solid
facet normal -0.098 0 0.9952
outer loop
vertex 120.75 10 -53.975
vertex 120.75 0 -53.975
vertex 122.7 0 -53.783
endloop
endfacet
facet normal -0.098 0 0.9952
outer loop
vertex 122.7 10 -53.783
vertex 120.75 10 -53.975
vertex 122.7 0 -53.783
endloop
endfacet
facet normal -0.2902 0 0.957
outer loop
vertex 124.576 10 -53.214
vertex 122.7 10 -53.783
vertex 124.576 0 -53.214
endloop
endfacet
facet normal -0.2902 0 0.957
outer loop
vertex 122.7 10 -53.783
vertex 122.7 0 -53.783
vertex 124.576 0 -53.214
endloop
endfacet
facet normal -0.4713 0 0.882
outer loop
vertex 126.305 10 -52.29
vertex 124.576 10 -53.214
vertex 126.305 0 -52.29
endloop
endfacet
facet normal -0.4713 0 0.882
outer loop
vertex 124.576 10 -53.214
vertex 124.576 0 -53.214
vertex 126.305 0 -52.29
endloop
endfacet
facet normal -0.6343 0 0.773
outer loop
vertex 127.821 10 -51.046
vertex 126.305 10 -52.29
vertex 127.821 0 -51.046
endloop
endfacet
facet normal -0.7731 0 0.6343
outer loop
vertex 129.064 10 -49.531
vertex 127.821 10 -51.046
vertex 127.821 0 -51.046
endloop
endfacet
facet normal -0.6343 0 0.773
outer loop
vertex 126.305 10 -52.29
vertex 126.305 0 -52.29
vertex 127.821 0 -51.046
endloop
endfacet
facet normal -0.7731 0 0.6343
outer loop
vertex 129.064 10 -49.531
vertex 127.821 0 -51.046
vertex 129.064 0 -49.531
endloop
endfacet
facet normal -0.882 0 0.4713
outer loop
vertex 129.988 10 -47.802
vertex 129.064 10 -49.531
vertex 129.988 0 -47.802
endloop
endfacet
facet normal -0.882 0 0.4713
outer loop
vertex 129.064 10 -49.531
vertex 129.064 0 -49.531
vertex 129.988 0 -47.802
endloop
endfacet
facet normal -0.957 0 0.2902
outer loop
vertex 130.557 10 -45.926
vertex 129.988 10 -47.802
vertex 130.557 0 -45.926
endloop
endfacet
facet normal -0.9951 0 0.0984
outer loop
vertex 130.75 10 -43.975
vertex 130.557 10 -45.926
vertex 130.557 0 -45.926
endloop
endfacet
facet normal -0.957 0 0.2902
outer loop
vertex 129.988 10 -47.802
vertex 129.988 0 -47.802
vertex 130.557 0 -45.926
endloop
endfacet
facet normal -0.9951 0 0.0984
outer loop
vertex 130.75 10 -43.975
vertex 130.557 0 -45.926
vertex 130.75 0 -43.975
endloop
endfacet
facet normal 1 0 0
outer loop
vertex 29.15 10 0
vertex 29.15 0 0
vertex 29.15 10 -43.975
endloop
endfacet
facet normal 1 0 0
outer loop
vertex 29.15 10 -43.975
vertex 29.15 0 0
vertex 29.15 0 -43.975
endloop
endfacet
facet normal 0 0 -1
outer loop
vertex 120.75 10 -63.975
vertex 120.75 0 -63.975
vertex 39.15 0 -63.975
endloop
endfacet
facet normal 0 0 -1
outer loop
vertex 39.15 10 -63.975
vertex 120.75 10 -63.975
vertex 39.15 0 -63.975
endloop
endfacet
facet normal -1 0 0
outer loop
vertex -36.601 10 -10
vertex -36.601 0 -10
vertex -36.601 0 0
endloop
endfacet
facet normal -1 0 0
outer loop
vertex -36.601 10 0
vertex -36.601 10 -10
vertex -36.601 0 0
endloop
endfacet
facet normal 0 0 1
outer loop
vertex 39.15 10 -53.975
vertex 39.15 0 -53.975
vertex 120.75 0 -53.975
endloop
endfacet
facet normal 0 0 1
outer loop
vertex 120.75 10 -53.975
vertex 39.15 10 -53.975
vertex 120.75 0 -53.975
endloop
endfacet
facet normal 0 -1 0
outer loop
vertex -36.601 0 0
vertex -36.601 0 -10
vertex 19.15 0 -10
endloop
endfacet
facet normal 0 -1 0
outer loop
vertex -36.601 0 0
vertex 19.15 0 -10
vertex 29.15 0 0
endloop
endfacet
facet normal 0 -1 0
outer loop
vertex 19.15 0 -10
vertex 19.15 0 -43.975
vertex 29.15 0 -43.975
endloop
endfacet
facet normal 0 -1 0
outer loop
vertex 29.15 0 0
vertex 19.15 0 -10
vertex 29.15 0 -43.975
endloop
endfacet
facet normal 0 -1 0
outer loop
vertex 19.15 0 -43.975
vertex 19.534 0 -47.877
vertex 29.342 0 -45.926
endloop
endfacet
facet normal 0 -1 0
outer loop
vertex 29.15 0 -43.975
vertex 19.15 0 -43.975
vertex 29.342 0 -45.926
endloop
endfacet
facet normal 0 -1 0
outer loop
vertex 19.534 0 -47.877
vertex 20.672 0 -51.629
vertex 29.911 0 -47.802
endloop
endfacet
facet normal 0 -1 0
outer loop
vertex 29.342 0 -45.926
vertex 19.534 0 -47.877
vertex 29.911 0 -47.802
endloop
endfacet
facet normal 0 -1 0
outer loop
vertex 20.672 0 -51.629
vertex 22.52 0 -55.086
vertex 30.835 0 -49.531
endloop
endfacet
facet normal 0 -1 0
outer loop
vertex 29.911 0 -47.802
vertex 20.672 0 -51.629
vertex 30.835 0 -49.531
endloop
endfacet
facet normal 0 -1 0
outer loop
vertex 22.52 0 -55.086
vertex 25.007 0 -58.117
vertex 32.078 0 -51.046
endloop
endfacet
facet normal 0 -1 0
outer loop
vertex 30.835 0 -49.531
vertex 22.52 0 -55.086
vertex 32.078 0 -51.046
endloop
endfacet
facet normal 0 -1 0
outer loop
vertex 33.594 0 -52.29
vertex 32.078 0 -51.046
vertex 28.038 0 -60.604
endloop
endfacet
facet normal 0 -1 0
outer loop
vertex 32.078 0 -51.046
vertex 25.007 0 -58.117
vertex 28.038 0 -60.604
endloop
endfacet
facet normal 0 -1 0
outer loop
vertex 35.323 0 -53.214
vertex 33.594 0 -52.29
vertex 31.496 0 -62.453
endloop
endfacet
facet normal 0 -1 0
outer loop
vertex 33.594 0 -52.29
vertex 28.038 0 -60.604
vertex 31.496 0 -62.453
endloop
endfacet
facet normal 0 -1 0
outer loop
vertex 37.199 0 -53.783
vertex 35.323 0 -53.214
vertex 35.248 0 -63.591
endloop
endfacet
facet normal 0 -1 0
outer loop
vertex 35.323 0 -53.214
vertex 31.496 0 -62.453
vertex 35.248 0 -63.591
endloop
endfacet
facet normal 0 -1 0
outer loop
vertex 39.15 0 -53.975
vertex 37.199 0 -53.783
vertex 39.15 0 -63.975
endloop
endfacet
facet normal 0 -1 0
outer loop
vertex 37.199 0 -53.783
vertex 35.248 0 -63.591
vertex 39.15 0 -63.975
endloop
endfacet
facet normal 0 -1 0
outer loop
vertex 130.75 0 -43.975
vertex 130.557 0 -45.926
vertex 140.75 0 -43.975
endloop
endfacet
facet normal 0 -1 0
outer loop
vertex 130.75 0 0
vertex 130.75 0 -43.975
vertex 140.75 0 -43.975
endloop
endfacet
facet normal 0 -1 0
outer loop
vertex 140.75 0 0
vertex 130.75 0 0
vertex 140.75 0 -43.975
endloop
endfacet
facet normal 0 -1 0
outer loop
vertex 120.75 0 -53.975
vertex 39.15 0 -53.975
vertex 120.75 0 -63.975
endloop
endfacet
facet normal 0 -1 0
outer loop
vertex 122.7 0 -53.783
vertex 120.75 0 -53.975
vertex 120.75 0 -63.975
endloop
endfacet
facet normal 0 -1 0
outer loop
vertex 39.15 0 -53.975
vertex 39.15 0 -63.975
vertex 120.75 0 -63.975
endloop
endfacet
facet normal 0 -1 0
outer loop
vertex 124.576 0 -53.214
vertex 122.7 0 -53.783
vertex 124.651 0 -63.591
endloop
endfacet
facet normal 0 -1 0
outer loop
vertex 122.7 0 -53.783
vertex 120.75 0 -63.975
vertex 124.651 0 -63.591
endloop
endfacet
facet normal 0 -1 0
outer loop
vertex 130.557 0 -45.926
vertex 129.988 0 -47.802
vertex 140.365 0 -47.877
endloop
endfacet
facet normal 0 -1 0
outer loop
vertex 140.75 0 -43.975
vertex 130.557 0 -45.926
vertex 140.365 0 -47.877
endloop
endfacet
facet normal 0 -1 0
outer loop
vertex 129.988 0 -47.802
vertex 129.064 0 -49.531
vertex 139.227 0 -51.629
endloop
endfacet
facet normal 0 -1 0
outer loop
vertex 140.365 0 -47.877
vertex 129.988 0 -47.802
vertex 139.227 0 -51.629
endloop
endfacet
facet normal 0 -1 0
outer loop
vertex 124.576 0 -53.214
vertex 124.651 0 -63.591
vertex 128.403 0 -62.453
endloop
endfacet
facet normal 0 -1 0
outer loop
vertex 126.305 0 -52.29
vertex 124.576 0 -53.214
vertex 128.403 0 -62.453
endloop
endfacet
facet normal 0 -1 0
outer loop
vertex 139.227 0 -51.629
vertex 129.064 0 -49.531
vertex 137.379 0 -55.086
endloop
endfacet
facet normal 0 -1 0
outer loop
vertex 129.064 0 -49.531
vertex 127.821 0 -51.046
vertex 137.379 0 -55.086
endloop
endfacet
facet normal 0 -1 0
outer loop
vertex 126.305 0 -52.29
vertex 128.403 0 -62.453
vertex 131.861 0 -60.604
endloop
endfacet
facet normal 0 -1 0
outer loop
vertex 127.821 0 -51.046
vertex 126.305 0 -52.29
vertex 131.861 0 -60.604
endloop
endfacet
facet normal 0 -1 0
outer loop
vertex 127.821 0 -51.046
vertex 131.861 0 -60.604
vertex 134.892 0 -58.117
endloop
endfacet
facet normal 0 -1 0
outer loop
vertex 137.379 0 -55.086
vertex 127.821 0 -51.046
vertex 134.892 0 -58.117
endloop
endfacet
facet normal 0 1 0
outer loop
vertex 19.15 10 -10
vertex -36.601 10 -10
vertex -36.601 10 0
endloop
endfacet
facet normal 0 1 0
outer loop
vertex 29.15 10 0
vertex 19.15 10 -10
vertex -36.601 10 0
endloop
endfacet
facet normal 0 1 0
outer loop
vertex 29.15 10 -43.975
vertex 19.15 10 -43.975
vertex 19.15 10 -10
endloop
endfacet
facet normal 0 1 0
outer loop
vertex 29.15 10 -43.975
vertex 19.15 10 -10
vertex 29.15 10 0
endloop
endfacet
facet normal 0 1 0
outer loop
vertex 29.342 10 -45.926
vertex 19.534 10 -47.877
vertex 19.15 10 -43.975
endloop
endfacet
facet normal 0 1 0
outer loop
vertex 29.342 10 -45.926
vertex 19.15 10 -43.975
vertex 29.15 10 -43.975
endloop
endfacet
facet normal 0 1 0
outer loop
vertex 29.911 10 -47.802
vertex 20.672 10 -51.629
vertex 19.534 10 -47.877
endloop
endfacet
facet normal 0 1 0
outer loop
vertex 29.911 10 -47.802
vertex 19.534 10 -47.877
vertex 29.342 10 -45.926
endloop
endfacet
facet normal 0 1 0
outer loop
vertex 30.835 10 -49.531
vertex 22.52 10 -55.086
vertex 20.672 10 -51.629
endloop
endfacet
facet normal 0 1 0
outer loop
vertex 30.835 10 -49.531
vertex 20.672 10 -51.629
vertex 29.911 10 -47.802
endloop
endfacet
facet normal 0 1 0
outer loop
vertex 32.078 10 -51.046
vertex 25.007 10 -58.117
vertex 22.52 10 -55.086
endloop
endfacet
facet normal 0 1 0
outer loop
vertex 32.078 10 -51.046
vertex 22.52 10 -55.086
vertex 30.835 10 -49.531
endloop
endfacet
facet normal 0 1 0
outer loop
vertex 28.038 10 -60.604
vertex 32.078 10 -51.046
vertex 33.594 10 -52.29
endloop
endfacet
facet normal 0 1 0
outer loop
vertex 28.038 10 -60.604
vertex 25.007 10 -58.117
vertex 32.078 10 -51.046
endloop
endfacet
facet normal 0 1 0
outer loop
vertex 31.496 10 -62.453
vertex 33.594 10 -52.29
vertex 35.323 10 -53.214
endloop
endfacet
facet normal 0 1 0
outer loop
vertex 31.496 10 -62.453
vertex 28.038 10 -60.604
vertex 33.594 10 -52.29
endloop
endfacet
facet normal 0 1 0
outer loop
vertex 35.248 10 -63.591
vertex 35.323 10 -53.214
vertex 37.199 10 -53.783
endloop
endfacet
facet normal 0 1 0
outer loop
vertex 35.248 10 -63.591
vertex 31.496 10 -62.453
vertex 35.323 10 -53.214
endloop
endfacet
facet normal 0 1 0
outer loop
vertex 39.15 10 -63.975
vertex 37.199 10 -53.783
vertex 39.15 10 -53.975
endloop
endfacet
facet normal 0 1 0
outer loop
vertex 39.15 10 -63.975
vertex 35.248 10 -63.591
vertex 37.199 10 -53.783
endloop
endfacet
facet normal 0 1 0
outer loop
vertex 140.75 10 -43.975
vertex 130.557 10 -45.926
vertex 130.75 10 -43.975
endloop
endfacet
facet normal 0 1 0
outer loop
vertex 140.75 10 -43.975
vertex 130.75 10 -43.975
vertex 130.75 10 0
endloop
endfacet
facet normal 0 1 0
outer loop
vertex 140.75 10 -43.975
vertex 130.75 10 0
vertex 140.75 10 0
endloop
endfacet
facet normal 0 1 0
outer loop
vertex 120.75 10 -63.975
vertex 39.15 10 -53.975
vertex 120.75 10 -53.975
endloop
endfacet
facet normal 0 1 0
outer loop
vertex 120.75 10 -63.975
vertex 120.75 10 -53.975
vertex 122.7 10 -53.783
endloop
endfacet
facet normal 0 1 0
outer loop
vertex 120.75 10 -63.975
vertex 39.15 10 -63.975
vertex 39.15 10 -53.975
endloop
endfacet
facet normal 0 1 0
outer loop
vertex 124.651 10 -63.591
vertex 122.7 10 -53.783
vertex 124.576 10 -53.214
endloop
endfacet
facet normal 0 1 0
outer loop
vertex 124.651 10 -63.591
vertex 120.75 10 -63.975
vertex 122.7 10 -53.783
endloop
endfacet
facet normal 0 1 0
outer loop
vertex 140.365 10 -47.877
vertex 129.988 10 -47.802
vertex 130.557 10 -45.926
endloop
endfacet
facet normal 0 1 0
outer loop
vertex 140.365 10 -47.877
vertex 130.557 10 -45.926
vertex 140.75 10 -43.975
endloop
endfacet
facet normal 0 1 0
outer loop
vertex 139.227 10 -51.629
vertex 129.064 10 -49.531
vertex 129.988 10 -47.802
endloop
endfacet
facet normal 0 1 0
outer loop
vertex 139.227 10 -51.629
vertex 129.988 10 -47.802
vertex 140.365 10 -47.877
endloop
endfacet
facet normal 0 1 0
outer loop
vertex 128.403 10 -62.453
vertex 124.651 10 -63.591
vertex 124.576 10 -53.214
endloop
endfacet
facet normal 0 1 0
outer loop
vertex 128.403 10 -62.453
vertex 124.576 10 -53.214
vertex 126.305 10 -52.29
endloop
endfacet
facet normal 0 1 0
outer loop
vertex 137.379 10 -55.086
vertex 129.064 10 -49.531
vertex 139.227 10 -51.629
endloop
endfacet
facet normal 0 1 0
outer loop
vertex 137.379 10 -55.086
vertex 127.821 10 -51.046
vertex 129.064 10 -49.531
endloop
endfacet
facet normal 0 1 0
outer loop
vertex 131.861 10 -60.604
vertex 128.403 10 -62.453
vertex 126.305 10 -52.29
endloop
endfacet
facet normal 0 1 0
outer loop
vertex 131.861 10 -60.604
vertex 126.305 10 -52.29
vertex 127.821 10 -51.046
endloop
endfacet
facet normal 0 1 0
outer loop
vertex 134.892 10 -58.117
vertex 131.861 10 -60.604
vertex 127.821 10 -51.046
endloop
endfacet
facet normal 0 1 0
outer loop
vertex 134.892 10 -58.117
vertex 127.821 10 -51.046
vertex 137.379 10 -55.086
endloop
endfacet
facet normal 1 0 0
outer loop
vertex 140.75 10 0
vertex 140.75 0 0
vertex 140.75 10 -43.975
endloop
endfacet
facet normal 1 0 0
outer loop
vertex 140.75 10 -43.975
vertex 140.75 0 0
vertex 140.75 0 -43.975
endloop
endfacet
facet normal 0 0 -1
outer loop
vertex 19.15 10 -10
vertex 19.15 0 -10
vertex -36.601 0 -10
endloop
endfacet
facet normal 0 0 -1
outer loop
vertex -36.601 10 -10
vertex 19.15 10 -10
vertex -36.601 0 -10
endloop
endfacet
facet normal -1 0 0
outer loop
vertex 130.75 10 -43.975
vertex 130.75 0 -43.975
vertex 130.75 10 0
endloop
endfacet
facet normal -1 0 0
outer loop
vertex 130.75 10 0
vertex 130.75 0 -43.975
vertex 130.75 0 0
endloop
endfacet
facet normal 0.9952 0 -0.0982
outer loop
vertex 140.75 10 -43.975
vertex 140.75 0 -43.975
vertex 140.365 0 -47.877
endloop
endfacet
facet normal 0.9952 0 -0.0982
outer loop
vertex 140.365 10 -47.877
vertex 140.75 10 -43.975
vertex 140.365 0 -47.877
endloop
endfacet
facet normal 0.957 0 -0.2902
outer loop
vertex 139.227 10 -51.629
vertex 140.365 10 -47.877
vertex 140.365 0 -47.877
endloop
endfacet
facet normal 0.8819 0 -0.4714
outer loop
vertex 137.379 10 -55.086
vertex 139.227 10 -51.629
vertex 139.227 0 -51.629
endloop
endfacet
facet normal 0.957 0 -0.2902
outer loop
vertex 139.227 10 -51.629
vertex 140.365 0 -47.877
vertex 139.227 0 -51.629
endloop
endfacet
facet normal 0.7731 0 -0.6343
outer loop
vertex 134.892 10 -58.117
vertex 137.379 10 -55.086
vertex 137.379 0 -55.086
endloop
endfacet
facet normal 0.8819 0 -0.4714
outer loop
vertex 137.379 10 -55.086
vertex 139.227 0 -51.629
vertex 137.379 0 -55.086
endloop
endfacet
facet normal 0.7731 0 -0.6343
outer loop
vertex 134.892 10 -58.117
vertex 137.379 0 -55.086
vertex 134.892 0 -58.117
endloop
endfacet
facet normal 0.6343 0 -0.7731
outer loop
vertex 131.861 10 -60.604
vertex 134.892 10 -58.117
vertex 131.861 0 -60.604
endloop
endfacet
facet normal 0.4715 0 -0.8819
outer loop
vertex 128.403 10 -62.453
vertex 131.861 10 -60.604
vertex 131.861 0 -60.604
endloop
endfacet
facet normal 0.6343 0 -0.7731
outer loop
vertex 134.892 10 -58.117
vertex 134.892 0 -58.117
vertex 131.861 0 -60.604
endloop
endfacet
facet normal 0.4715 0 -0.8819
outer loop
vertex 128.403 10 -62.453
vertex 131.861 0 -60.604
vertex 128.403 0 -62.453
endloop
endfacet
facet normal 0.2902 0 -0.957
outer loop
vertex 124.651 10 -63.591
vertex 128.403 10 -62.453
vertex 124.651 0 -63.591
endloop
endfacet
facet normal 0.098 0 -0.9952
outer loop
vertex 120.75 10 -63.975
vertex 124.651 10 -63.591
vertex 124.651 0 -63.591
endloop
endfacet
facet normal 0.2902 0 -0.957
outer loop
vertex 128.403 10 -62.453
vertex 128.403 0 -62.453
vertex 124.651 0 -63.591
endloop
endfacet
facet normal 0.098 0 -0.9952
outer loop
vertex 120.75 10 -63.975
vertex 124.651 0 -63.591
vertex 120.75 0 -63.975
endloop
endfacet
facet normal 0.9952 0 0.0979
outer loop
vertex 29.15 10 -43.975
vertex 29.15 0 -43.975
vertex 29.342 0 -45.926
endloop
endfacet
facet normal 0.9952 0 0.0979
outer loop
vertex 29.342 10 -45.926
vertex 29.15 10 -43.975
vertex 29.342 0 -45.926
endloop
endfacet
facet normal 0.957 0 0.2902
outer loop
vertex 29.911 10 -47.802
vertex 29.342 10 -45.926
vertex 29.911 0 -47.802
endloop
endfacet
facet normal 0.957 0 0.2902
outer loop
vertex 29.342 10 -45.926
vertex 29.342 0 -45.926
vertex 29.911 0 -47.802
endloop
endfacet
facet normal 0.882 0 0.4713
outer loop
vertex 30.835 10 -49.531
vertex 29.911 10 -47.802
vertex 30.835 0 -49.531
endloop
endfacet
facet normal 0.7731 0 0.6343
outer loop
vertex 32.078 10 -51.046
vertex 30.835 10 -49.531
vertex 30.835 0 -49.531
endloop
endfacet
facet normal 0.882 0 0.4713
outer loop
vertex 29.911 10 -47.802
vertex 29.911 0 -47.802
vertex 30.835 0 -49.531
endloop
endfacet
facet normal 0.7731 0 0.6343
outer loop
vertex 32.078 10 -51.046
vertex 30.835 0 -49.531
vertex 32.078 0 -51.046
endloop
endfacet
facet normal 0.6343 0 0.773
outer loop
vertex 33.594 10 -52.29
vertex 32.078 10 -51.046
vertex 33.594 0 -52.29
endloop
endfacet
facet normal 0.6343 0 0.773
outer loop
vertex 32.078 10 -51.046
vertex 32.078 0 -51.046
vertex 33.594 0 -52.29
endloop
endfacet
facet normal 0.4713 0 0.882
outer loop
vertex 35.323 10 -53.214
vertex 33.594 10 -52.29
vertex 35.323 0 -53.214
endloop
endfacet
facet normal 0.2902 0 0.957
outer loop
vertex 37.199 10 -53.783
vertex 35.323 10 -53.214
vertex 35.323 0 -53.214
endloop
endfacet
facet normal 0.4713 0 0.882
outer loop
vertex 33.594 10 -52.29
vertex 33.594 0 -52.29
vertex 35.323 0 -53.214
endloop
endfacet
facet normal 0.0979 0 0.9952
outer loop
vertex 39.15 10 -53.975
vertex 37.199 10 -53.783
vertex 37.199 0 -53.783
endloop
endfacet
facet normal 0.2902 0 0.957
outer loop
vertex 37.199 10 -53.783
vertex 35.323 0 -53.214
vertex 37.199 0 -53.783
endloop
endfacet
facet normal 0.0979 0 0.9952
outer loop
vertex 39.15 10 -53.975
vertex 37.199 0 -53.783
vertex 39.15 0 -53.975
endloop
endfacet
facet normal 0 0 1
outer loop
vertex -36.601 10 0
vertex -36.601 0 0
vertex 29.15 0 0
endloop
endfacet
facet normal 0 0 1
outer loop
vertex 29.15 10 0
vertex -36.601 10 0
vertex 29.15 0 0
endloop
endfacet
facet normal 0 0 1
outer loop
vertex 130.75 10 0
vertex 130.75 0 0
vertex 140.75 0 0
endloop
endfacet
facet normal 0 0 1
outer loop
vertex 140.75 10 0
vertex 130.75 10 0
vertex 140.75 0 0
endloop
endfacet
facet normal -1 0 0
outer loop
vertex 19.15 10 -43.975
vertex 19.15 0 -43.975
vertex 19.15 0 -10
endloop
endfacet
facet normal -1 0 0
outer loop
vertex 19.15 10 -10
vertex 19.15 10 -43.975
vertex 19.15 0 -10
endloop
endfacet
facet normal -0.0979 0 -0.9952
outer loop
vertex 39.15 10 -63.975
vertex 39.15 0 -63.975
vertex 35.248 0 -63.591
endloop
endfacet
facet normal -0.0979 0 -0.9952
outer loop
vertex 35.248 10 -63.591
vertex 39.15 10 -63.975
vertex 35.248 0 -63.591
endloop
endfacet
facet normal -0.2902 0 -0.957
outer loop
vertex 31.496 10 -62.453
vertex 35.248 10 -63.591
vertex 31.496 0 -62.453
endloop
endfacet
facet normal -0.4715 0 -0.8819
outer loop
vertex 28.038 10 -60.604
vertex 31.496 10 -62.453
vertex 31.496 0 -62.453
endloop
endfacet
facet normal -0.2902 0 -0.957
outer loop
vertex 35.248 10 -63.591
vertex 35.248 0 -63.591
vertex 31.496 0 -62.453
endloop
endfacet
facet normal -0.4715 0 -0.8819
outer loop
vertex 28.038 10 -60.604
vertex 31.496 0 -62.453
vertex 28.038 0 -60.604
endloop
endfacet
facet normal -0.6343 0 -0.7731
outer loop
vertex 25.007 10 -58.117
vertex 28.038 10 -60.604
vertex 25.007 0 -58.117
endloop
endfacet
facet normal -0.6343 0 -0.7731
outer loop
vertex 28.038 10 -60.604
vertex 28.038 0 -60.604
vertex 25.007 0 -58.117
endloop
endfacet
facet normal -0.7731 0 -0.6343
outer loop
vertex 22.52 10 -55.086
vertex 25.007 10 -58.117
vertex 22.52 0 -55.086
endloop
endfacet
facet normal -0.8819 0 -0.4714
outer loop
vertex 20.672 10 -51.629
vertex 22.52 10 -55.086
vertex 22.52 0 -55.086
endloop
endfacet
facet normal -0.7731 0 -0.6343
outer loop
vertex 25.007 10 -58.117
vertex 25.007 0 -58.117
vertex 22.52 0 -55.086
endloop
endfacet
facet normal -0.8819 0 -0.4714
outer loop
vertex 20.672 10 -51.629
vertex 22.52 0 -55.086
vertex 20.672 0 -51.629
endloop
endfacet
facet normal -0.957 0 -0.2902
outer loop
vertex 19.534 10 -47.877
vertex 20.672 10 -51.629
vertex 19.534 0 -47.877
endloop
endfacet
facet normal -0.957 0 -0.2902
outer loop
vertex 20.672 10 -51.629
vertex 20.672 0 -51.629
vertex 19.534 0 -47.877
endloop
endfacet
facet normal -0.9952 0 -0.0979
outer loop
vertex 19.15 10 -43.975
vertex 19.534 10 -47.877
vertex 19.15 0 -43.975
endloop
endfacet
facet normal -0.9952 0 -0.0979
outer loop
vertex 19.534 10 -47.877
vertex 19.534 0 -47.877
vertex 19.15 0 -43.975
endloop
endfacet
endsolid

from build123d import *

# Parameters (mm, degrees)
BOSS_EXTRUDE1_DEPTH = 10


with BuildPart() as part:
    # Sketch1 → Boss-Extrude1 (new body)
    with BuildSketch(Plane(origin=(0, 0, 0), x_dir=(1, 0, 0), z_dir=(0, 1, 0))):
        with BuildLine():
            Line((0, 0), (29.149551568, 0))
            Line((29.149551568, 0), (29.149551568, 43.975))
            ThreePointArc((29.149551568, 43.975), (32.078483756, 51.046067812), (39.149551568, 53.975))
            Line((39.149551568, 53.975), (120.749551568, 53.975))
            ThreePointArc((120.749551568, 53.975), (127.82061938, 51.046067812), (130.749551568, 43.975))
            Line((130.749551568, 43.975), (130.749551568, 0))
            Line((130.749551568, 0), (140.749551568, 0))
            Line((140.749551568, 0), (140.749551568, 43.975))
            ThreePointArc((140.749551568, 43.975), (134.891687192, 58.117135624), (120.749551568, 63.975))
            Line((120.749551568, 63.975), (39.149551568, 63.975))
            ThreePointArc((39.149551568, 63.975), (25.007415944, 58.117135624), (19.149551568, 43.975))
            Line((19.149551568, 43.975), (19.149551568, 10))
            Line((19.149551568, 10), (0, 10))
            Line((0, 10), (-36.600725287, 10))
            Line((-36.600725287, 10), (-36.600725287, 0))
            Line((-36.600725287, 0), (0, 0))
        make_face()
    extrude(amount=BOSS_EXTRUDE1_DEPTH)


solid = part.part
